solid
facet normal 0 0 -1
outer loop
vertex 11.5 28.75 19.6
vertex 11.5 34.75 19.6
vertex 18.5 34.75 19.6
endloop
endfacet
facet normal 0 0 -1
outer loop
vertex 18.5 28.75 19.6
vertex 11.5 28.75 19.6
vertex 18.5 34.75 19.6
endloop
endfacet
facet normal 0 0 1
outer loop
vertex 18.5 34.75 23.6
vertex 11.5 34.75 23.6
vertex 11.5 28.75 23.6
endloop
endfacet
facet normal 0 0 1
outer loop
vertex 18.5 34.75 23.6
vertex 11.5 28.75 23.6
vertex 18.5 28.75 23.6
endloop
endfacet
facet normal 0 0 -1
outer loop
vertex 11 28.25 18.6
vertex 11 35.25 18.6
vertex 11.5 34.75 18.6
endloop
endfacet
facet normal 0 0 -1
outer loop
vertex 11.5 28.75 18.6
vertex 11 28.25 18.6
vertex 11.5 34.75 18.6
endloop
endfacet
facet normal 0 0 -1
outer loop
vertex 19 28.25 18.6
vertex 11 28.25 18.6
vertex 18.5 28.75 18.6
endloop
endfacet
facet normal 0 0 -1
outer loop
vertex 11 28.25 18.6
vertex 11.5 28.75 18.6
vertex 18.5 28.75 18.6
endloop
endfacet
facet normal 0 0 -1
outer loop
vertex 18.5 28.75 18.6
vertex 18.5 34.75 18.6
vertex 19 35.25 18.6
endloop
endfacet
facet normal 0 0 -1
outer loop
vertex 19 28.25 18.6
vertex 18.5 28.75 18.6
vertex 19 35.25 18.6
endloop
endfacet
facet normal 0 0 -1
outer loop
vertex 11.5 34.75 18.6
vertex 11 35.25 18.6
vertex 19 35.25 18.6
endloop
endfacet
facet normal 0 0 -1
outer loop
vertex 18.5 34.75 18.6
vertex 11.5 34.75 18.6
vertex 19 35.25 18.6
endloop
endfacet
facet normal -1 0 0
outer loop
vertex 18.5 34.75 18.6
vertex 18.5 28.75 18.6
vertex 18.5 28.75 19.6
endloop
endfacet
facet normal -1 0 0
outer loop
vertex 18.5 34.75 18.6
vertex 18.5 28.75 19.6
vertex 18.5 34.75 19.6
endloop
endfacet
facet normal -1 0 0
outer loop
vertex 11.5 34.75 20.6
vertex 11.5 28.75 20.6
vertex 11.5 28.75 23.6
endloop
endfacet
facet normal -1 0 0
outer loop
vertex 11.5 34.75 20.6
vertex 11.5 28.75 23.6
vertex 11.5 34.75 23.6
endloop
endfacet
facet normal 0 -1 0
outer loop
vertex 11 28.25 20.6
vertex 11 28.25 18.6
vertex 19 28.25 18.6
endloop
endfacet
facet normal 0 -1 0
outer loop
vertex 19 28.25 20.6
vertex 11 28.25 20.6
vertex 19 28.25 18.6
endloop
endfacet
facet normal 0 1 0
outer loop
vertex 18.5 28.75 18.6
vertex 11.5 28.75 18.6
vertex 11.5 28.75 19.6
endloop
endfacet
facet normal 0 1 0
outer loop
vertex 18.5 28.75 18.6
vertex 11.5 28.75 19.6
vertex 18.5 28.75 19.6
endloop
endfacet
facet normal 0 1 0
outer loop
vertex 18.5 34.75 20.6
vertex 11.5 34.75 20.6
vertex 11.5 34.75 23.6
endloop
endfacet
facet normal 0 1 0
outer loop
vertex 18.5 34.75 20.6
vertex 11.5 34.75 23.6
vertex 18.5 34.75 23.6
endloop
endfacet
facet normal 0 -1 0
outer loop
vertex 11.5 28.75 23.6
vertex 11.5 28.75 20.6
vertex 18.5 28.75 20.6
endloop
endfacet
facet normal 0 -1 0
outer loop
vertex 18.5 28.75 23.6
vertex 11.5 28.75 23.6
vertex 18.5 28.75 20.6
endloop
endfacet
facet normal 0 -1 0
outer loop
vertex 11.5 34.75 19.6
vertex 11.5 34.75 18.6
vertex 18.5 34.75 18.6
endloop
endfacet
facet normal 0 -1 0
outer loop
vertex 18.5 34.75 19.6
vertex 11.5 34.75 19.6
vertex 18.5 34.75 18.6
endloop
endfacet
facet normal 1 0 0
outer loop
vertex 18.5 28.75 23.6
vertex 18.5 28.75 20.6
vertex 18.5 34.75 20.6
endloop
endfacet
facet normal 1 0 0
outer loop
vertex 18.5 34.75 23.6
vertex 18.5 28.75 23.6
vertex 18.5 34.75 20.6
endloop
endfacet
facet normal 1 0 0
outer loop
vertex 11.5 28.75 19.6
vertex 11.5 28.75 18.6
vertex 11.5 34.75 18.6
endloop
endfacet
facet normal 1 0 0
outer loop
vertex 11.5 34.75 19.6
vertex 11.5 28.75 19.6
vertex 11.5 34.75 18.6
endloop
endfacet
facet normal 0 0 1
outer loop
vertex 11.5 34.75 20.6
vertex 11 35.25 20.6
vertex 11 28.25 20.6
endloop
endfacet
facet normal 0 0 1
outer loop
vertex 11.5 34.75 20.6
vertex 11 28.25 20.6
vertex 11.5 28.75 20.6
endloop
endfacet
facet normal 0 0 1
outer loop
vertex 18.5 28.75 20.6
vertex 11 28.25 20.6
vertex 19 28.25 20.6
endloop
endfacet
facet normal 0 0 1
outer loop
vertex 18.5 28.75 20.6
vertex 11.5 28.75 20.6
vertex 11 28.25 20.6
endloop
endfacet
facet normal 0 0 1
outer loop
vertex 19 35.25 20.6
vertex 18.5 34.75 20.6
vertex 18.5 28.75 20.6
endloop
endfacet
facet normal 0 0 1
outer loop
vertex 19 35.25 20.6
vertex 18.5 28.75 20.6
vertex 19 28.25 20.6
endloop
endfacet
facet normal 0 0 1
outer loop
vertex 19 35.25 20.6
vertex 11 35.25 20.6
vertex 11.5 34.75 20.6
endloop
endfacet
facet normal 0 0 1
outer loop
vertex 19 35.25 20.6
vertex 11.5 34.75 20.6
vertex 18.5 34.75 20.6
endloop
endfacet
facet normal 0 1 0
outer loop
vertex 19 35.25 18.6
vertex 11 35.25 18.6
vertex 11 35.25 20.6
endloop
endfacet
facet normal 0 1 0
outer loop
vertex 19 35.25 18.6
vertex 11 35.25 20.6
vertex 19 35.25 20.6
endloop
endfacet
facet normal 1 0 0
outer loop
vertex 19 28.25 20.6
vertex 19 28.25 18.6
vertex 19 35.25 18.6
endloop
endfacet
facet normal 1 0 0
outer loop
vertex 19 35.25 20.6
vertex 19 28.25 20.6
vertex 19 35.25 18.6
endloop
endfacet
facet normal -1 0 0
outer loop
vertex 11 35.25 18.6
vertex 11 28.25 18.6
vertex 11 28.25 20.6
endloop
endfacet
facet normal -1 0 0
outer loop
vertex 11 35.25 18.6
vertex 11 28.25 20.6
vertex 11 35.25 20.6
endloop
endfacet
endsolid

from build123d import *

# Parameters (mm, degrees)
BOX073_W     = 7
BOX073_H     = 6
BOX073_DEPTH = 1
BOX072_W     = 8
BOX072_H     = 7
BOX072_DEPTH = 2
BOX071_W     = 7
BOX071_H     = 6
BOX071_DEPTH = 3


with BuildPart() as box073:
    # Box073 → Box073 (new body)
    with BuildSketch(Plane(origin=(11.5, 28.75, 18.6), x_dir=(1, 0, 0), z_dir=(0, 0, 1))):
        with Locations((3.5, 3)):
            Rectangle(BOX073_W, BOX073_H)
    extrude(amount=BOX073_DEPTH)


with BuildPart() as box072:
    # Box072 → Box072 (new body)
    with BuildSketch(Plane(origin=(11, 28.25, 18.6), x_dir=(1, 0, 0), z_dir=(0, 0, 1))):
        with Locations((4, 3.5)):
            Rectangle(BOX072_W, BOX072_H)
    extrude(amount=BOX072_DEPTH)


with BuildPart() as cut009:
    # Box071 → Box071 (new body)
    with BuildSketch(Plane(origin=(11.5, 28.75, 20.6), x_dir=(1, 0, 0), z_dir=(0, 0, 1))):
        with Locations((3.5, 3)):
            Rectangle(BOX071_W, BOX071_H)
    extrude(amount=BOX071_DEPTH)

    # Fusion024: union Box072
    add(box072.part)

    # Cut009: cut Box073
    add(box073.part, mode=Mode.SUBTRACT)


solid = cut009.part
